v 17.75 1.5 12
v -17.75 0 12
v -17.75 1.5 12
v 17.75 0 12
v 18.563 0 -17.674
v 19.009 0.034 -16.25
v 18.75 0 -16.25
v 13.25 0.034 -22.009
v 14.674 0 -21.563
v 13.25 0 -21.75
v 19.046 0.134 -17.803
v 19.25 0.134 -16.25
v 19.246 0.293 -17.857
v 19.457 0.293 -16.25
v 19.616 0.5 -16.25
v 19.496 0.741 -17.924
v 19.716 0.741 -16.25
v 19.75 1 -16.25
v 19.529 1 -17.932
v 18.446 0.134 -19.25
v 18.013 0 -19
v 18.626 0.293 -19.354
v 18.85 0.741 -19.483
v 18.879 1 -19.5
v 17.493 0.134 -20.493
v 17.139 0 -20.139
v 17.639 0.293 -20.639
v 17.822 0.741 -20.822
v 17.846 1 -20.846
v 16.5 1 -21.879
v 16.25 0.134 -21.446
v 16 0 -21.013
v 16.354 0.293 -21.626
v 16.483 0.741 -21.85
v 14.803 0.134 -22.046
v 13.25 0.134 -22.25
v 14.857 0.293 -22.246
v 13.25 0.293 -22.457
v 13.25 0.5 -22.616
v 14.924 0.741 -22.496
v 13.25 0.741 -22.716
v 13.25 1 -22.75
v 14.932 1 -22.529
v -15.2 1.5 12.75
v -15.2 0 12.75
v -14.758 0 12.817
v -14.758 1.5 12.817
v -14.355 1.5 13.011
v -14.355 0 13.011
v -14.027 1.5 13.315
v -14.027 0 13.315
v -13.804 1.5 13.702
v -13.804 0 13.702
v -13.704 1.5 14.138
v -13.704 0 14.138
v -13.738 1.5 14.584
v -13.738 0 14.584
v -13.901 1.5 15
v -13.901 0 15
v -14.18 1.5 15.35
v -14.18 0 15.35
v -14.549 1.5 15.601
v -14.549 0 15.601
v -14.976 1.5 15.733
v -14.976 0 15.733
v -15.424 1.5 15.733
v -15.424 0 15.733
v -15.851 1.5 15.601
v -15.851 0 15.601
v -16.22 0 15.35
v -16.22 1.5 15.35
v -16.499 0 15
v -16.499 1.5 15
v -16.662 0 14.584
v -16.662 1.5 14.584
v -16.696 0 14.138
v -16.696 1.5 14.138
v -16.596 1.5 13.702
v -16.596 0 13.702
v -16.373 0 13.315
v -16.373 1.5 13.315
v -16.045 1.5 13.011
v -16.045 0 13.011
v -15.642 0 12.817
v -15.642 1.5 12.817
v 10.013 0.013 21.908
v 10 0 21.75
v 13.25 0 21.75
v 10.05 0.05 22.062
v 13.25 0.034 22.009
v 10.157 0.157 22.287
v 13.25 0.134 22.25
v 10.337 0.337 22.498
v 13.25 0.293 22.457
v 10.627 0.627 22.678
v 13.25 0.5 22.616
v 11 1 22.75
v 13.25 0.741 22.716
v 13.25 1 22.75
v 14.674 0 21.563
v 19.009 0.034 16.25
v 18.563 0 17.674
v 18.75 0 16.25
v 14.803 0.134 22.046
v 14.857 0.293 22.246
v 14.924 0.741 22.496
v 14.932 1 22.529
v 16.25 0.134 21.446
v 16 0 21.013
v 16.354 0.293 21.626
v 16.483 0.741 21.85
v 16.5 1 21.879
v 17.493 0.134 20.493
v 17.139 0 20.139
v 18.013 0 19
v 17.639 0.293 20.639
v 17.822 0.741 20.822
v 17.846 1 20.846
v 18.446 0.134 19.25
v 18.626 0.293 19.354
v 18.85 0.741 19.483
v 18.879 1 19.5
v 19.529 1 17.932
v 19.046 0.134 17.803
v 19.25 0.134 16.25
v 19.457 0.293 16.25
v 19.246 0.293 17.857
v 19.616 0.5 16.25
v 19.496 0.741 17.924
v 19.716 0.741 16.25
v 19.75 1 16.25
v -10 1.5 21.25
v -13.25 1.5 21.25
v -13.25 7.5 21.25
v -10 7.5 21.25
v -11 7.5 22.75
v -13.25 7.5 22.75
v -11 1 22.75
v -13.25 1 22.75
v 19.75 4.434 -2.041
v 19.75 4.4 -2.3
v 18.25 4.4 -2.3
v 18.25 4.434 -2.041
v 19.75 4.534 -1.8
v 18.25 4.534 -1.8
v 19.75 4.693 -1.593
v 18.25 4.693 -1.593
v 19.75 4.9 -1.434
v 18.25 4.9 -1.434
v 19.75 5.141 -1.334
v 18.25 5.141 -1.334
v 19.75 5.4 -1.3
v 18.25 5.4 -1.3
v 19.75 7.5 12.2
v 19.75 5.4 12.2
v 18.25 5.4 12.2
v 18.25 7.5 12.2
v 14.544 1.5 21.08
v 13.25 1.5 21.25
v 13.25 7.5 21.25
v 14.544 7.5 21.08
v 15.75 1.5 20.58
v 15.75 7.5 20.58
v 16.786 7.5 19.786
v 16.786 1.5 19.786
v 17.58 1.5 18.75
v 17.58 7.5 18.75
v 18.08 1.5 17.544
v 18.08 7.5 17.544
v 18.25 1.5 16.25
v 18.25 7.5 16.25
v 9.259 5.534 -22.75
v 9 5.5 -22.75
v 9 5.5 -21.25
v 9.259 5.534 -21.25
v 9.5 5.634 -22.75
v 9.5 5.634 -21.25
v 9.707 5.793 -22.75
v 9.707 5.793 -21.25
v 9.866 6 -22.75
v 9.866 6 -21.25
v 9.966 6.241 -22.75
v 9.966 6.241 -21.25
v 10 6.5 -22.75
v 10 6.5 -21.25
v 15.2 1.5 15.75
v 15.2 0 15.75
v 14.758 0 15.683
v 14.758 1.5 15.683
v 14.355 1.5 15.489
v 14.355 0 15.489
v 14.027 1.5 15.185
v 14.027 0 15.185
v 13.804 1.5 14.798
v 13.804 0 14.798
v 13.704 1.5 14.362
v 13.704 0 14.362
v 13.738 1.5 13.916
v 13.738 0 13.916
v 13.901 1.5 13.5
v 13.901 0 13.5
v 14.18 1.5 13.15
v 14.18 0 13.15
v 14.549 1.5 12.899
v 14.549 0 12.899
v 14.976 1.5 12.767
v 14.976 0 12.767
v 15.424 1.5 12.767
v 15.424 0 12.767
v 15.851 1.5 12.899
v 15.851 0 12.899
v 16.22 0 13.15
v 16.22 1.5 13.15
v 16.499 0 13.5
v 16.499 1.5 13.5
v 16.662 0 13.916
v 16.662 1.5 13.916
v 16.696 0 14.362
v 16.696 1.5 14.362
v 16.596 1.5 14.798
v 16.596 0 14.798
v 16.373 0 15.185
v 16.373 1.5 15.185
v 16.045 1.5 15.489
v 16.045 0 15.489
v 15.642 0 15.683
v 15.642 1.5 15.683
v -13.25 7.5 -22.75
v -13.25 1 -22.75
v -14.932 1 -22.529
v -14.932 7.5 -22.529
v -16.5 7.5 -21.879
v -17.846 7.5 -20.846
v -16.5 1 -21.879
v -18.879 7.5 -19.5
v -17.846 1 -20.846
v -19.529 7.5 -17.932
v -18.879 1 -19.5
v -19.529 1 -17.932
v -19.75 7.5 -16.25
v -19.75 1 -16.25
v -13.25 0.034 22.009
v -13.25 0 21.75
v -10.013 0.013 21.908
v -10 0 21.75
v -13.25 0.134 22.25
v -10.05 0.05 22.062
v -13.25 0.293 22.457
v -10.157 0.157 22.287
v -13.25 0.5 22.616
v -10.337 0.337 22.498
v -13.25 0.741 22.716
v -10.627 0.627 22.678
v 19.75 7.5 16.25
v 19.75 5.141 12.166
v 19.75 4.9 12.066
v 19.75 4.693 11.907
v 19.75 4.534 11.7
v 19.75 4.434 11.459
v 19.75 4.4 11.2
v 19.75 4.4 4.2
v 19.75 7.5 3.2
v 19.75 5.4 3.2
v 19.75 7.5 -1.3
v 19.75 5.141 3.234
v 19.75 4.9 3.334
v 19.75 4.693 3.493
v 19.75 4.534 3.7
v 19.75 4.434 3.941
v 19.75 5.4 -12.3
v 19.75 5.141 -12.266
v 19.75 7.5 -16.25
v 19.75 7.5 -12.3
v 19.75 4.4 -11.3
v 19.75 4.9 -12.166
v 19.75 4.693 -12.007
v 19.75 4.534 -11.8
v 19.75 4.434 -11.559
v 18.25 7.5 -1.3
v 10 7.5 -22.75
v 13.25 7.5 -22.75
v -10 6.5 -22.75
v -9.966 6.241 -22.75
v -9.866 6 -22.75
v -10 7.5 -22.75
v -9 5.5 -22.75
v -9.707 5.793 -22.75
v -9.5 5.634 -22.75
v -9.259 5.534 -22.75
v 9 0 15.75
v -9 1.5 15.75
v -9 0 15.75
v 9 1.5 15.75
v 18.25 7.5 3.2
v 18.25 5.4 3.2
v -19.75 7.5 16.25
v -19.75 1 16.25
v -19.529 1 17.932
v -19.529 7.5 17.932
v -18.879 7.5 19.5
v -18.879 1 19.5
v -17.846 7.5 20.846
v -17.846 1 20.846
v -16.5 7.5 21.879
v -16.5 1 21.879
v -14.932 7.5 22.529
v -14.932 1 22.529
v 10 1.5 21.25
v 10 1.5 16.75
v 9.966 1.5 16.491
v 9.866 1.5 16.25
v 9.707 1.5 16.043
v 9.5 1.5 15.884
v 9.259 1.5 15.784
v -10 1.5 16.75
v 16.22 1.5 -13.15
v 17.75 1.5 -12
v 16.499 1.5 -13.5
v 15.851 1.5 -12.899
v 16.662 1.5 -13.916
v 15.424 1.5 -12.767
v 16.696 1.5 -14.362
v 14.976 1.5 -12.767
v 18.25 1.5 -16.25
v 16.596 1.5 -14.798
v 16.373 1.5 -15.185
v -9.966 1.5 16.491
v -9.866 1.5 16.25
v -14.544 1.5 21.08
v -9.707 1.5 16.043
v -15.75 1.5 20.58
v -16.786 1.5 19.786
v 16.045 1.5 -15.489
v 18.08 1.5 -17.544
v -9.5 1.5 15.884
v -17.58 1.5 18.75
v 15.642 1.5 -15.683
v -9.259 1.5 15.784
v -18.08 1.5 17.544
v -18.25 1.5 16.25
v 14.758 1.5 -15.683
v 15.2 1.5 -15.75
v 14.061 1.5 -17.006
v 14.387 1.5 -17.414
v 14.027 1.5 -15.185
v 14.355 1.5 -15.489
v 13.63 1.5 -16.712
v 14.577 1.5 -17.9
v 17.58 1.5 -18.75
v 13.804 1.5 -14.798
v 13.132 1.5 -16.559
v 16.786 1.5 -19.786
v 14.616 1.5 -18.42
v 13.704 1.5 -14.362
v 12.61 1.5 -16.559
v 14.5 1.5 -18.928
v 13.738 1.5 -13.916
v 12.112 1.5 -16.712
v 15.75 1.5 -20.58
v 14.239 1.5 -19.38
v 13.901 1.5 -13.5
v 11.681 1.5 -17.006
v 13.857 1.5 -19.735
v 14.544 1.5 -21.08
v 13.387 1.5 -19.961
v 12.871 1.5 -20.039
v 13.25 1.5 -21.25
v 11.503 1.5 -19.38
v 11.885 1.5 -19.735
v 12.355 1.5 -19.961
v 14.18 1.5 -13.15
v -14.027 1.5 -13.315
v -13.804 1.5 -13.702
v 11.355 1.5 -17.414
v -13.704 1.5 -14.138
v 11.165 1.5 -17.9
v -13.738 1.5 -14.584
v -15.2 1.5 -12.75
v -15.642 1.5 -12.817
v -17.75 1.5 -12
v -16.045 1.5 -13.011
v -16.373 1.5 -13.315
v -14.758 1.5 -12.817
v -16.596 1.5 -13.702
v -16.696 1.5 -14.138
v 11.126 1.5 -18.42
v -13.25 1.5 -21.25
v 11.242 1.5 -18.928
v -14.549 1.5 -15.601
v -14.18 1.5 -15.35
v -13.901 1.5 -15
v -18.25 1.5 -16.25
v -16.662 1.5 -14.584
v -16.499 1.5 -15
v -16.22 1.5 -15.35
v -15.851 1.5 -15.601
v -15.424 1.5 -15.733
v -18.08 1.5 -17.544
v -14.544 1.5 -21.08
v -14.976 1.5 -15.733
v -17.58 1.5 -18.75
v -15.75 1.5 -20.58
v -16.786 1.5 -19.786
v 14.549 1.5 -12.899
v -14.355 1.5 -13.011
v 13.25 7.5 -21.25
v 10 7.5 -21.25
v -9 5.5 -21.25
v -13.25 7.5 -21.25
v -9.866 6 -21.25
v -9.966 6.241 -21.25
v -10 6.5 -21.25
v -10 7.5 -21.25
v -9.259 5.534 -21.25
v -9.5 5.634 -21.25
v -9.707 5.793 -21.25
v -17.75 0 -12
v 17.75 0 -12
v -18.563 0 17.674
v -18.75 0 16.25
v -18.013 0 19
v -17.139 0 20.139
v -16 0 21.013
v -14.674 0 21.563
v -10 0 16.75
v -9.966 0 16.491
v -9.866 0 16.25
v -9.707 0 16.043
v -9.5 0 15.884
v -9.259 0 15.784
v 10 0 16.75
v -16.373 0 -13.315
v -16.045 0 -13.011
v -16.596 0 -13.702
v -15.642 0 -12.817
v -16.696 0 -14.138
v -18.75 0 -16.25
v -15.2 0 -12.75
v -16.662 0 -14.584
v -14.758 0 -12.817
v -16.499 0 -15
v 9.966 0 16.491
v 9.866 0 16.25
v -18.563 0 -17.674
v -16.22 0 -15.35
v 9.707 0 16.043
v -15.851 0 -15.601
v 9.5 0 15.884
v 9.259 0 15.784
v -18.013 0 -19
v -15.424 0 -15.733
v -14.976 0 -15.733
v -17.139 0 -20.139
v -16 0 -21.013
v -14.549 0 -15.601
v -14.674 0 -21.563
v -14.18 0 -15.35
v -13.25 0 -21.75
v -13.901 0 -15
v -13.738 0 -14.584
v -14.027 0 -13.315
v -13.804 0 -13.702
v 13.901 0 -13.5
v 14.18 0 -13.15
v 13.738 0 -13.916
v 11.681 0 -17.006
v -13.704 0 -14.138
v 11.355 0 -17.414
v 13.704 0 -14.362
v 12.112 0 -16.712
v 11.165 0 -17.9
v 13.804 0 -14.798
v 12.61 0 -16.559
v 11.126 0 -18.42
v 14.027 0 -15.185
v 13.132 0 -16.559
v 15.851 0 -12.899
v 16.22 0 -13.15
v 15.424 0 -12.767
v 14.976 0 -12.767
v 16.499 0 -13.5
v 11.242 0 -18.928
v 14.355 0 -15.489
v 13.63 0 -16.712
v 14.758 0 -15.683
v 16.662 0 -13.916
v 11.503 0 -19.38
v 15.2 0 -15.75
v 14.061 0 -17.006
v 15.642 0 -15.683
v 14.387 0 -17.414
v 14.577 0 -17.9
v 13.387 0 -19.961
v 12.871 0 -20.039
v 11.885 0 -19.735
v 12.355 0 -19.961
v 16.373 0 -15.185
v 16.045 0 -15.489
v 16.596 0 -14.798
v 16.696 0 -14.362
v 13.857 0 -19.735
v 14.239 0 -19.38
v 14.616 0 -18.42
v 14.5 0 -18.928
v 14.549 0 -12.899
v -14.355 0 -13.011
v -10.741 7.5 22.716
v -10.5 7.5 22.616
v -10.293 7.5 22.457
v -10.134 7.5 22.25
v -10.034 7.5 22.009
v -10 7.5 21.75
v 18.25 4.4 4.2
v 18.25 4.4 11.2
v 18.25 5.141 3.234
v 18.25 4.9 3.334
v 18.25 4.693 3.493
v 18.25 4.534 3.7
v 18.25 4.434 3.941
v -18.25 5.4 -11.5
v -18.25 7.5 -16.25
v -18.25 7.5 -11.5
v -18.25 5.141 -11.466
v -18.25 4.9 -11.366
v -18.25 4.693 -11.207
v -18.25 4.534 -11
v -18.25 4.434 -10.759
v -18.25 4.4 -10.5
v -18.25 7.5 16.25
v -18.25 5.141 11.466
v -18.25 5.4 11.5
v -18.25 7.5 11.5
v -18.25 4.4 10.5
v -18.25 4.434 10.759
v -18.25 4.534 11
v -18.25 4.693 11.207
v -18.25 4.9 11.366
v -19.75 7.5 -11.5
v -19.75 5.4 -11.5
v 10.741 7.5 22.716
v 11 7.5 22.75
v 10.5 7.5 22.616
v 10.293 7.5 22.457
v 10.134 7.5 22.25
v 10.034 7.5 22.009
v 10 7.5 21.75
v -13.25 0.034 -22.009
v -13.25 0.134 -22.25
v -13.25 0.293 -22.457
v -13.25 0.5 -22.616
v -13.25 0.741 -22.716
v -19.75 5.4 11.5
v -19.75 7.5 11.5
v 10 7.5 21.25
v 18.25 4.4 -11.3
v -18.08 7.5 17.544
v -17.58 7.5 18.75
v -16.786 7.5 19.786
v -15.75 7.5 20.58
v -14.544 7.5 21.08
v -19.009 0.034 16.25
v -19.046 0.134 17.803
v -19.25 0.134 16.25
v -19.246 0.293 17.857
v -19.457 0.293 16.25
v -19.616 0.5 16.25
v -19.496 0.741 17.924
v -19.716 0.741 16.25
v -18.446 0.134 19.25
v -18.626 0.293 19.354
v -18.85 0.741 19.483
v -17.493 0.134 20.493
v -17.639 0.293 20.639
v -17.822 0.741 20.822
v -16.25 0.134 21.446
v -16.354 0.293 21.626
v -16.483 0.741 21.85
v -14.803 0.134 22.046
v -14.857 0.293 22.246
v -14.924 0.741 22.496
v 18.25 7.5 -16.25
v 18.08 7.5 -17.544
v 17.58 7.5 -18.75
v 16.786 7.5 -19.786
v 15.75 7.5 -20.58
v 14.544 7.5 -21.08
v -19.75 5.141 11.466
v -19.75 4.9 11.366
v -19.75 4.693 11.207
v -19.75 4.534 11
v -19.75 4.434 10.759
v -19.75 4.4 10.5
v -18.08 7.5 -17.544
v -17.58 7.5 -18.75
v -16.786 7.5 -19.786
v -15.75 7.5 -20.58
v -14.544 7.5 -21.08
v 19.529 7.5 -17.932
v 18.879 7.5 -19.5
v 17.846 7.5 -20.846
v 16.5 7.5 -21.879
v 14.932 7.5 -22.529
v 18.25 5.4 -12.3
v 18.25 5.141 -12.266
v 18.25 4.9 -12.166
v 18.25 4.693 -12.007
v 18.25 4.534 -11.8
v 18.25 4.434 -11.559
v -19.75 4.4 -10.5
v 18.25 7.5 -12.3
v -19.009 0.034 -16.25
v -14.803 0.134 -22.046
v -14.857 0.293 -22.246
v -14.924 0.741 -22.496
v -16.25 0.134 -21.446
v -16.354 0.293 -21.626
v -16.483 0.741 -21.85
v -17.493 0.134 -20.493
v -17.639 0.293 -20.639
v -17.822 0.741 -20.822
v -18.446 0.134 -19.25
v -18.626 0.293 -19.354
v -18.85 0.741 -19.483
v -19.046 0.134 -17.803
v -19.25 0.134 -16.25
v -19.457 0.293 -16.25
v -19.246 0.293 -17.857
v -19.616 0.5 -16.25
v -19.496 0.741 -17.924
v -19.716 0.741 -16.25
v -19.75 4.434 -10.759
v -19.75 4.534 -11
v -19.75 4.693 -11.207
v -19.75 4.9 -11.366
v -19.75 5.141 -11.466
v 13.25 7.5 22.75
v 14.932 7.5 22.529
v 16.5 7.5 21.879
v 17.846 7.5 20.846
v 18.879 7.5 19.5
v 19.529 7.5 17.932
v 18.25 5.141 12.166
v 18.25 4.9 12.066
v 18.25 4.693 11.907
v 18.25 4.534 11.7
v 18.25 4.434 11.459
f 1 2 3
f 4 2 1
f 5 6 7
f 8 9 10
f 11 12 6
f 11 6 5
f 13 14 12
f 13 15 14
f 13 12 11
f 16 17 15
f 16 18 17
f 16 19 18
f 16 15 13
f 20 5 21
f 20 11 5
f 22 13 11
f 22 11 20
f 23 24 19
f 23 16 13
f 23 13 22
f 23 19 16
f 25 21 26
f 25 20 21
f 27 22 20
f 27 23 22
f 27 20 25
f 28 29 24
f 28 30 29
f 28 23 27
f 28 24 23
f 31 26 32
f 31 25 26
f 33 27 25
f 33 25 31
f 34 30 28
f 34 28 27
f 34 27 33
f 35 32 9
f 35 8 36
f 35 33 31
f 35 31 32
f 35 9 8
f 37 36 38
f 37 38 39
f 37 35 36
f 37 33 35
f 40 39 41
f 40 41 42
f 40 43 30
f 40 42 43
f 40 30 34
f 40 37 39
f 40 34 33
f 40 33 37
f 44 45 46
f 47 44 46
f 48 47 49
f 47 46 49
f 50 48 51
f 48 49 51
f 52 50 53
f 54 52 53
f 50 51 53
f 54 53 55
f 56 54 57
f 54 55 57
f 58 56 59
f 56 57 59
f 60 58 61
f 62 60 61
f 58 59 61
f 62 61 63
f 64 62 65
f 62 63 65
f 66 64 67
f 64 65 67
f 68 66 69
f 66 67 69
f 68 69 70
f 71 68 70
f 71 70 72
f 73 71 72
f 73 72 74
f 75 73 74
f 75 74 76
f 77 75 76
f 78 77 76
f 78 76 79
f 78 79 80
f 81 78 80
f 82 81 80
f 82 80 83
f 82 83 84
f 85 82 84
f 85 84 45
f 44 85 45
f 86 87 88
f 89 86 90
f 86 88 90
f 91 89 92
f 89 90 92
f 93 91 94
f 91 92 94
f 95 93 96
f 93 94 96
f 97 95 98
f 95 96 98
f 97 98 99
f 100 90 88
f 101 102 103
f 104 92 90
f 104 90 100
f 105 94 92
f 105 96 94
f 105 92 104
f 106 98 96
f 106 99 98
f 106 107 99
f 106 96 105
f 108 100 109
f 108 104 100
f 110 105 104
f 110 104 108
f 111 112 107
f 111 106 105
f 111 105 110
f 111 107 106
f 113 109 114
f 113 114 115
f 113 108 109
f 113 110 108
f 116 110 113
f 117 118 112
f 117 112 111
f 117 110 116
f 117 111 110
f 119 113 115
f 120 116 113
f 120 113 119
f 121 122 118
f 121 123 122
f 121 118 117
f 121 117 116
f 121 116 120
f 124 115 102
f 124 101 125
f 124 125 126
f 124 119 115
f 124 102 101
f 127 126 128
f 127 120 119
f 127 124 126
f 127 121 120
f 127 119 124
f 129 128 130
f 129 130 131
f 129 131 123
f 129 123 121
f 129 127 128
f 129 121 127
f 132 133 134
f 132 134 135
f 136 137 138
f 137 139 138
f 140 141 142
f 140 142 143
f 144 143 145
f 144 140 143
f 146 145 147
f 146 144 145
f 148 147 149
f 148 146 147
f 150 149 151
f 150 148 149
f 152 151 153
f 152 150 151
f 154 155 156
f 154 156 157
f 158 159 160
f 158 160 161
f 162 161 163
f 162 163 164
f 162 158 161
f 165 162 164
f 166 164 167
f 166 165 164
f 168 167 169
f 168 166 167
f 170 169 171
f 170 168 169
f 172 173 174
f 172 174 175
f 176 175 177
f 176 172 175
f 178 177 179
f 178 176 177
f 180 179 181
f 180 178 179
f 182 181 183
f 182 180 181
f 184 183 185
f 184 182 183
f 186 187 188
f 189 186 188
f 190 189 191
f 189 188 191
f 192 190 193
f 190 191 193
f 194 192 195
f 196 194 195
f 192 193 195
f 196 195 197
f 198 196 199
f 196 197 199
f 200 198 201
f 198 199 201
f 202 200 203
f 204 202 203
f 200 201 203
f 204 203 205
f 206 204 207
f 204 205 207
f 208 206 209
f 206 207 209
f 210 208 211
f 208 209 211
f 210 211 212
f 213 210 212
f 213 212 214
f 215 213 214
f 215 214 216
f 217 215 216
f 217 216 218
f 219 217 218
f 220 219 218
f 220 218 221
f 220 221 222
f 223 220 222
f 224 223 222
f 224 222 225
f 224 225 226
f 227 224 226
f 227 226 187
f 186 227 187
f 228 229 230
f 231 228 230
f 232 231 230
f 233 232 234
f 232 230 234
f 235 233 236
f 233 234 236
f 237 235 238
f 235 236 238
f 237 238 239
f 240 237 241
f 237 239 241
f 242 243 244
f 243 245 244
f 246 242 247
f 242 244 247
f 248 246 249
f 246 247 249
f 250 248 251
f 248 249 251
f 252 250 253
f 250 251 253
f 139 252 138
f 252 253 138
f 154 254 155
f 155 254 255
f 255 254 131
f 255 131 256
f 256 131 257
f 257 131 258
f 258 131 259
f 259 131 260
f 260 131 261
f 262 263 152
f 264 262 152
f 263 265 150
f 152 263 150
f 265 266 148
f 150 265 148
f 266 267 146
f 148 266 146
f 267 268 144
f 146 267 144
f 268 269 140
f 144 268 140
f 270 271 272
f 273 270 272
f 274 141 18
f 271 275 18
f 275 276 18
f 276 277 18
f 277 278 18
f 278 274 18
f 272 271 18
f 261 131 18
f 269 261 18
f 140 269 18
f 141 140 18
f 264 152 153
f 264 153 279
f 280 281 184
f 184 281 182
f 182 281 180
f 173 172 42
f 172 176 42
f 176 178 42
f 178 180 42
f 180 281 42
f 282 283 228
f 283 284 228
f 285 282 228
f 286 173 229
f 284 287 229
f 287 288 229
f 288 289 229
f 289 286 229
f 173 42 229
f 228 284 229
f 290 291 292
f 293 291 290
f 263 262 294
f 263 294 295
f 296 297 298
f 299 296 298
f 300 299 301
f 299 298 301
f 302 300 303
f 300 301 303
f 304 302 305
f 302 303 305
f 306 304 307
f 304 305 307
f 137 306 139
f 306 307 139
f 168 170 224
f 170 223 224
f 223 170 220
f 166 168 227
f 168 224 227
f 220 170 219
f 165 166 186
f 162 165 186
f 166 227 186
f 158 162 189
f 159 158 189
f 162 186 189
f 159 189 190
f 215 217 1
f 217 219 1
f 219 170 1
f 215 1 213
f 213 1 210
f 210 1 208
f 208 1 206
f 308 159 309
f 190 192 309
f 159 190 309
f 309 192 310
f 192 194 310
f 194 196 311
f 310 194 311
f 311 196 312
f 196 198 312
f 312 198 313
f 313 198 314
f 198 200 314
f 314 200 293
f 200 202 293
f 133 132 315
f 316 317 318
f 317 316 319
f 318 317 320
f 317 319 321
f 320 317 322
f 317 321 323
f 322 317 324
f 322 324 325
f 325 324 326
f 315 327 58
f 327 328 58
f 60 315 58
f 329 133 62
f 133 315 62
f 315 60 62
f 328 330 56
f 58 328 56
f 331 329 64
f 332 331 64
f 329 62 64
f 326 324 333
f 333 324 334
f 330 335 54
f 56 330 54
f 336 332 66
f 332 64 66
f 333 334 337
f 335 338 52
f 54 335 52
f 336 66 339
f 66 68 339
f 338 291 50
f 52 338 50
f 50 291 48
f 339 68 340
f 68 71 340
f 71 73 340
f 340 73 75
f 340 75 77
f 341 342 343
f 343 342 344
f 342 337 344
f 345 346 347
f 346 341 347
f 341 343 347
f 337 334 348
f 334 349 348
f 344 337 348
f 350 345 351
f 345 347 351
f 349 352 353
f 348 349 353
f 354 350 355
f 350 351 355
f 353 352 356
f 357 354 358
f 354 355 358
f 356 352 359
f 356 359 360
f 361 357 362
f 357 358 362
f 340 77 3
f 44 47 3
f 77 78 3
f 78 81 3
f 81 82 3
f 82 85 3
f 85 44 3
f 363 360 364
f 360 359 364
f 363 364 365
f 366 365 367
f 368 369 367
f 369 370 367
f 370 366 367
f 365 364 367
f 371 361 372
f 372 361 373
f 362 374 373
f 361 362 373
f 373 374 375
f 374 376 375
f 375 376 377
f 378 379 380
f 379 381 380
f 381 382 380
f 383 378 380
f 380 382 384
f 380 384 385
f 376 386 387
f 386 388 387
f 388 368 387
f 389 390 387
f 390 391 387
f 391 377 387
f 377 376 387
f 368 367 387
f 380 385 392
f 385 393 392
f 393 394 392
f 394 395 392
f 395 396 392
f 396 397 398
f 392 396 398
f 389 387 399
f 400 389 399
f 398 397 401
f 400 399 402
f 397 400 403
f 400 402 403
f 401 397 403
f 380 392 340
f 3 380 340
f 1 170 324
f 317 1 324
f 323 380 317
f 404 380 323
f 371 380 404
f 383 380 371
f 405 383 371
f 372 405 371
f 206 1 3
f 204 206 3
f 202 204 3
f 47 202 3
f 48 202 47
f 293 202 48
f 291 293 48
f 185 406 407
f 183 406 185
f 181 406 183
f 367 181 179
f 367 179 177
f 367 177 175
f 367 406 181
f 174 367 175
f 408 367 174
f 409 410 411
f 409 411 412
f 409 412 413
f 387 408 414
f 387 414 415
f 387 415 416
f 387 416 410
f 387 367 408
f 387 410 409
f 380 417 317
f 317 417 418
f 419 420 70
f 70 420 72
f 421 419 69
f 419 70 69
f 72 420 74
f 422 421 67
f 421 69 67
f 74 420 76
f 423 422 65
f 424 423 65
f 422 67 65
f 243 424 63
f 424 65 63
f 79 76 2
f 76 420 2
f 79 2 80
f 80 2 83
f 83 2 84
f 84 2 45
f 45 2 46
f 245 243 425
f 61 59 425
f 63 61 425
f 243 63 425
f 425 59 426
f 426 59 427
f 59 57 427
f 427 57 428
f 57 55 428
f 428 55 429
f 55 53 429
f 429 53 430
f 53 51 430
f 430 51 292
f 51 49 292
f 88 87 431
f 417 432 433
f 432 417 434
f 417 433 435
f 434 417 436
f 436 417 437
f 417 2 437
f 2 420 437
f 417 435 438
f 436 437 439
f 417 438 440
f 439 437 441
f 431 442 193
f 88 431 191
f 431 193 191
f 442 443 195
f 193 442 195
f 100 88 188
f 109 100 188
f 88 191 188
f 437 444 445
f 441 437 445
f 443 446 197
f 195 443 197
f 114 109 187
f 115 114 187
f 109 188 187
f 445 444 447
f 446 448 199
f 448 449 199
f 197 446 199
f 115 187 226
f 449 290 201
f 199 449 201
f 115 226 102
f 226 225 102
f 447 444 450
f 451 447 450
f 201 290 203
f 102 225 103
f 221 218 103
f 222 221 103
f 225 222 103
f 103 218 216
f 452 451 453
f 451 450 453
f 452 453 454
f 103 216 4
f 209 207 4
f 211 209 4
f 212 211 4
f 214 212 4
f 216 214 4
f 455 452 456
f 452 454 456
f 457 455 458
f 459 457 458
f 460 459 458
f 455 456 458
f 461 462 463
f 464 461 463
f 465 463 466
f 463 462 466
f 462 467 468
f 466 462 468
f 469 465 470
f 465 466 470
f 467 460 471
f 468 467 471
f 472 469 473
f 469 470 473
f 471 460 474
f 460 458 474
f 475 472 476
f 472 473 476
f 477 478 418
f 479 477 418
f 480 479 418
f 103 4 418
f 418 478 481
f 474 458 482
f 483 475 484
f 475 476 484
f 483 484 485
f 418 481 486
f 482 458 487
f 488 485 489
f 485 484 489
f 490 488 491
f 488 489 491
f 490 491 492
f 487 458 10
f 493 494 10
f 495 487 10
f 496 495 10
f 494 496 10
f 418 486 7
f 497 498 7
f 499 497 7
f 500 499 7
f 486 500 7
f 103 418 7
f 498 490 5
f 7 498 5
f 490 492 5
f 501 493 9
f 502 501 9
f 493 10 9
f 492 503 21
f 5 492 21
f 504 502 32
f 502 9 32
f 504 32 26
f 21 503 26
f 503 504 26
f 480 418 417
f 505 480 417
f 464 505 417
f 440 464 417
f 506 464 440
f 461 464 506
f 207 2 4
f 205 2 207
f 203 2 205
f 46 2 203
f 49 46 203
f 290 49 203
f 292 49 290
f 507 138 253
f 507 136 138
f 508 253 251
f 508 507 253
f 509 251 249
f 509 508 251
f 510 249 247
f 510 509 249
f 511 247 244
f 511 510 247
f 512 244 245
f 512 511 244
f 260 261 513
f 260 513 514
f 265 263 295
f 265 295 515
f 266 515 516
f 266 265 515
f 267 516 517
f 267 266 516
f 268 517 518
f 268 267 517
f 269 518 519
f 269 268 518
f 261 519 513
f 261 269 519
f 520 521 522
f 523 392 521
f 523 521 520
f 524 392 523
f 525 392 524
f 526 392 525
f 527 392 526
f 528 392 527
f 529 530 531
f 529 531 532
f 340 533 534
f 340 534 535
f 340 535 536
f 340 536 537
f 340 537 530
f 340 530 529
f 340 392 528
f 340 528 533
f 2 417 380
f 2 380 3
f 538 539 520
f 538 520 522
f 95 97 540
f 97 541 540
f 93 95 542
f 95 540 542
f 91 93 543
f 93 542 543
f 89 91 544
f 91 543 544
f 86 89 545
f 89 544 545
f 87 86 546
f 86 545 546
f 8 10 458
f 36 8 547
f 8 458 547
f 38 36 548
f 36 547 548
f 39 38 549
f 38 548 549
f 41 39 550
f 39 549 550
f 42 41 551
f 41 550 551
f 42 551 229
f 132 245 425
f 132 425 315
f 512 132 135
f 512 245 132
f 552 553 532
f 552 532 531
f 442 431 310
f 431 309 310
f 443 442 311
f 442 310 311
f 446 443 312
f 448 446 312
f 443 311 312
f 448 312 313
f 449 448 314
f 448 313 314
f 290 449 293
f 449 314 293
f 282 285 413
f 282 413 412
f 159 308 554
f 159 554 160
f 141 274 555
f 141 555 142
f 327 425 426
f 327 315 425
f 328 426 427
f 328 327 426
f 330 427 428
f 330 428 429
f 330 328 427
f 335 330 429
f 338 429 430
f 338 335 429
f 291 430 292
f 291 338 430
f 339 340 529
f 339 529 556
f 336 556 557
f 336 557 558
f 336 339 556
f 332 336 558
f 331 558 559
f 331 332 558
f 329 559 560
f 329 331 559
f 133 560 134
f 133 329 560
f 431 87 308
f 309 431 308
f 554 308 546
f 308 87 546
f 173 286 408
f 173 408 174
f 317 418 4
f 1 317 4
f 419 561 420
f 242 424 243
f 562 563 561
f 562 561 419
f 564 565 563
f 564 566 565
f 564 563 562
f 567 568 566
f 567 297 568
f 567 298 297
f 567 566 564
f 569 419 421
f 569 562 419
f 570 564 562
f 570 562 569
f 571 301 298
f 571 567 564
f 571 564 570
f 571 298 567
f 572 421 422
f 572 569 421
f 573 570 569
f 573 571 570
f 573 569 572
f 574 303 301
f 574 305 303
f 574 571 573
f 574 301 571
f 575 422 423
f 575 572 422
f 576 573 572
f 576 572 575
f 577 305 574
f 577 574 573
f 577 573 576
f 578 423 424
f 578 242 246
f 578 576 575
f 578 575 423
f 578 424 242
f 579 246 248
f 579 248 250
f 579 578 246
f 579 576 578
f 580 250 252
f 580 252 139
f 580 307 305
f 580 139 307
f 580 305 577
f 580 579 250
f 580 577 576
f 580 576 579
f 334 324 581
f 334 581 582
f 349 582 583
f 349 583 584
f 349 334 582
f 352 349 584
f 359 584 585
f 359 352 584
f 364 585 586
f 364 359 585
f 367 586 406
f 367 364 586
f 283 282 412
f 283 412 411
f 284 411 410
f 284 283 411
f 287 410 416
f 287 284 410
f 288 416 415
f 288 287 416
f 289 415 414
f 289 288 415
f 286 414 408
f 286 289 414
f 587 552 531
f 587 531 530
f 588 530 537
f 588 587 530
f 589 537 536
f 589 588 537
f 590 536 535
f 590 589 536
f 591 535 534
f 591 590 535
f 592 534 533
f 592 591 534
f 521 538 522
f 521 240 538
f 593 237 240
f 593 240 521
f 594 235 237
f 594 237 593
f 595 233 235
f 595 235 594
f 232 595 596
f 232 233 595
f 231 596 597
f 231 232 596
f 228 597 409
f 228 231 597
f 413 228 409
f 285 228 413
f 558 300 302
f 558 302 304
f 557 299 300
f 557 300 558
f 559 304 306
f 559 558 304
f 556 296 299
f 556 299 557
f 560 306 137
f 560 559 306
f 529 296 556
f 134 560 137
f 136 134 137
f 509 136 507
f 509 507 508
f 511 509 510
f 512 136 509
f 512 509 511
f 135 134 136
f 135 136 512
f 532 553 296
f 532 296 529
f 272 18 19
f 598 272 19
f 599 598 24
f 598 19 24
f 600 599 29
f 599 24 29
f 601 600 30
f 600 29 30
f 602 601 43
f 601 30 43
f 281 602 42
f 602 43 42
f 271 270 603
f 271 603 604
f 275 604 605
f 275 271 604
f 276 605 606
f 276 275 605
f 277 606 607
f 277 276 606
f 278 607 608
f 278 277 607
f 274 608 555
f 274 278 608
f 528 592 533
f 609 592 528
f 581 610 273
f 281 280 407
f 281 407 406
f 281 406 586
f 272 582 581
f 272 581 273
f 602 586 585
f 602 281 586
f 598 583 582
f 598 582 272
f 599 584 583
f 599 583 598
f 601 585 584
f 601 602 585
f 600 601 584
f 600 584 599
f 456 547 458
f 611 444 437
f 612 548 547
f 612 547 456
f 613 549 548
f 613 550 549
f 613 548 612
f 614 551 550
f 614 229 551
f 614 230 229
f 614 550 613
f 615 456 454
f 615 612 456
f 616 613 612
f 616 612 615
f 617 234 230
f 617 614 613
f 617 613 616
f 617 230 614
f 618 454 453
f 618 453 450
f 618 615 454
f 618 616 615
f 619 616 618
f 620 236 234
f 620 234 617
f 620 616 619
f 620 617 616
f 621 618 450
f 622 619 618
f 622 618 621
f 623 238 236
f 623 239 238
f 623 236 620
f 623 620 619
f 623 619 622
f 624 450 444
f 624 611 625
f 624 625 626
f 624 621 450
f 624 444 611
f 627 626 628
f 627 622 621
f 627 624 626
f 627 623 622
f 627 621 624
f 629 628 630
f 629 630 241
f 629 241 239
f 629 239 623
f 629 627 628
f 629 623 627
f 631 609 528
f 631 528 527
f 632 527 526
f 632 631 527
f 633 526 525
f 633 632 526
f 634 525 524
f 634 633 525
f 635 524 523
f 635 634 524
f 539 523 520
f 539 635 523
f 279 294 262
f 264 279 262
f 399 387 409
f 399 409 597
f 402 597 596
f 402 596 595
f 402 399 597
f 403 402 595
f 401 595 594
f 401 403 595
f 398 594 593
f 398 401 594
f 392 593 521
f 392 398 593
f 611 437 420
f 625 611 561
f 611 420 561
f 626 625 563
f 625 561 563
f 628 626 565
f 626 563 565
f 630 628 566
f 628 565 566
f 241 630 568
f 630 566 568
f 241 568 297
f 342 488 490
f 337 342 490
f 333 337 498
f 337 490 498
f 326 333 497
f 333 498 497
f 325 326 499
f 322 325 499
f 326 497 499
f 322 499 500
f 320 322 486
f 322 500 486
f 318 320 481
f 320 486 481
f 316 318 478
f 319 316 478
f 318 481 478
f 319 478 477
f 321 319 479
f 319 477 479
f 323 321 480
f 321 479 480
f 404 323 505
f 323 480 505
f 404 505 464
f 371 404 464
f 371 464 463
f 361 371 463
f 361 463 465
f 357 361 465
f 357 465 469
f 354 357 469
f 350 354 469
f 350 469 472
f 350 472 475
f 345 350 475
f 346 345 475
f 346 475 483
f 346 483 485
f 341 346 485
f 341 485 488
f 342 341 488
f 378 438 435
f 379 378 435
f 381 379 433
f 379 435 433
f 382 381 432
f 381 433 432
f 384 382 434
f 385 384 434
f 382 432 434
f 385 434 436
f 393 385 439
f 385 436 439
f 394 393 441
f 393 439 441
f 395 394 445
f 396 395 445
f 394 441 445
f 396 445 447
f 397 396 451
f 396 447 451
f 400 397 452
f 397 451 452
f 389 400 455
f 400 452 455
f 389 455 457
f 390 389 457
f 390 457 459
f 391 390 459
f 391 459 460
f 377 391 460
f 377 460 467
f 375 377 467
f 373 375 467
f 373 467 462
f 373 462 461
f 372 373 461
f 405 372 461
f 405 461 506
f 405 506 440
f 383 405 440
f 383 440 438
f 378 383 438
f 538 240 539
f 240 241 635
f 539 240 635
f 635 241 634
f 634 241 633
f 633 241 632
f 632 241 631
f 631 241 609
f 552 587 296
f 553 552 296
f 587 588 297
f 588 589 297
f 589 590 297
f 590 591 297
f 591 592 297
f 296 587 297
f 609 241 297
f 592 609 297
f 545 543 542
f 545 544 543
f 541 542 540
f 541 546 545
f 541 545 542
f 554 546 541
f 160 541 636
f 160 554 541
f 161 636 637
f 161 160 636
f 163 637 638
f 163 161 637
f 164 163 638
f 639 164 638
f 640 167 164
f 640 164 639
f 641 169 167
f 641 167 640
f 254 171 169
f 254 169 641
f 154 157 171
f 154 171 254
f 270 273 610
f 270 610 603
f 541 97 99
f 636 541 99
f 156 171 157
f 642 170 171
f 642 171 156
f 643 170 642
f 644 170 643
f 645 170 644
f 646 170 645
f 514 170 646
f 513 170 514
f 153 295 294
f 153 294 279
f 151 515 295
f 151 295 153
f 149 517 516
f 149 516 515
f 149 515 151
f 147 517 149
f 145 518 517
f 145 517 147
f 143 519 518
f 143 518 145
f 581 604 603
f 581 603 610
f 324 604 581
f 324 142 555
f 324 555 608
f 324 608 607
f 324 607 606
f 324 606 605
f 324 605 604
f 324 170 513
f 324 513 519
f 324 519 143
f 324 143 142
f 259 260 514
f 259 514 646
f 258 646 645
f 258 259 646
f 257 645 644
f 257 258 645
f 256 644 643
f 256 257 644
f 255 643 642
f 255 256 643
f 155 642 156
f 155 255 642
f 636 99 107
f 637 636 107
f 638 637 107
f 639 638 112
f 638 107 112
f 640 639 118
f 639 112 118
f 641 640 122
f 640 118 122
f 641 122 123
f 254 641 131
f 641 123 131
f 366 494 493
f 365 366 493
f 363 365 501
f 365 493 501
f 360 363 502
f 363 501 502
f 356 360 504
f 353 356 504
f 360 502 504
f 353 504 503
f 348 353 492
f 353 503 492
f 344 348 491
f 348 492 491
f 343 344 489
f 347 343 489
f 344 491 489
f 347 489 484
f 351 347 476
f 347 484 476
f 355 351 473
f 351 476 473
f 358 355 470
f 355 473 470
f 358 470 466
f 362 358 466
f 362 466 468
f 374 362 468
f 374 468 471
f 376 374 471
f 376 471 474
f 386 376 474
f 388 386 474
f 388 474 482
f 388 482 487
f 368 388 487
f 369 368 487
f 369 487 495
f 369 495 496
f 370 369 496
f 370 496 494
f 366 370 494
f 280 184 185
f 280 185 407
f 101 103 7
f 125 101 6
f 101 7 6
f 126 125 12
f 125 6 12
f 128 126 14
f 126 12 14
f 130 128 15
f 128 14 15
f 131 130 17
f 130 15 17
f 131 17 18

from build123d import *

# Parameters (mm, degrees)
EXTRUDE_1_DEPTH      = 1.5
EXTRUDE_2_DEPTH      = 6
EXTRUDE_2_DEPTH_BACK = 1.5
CUT_EXTRUDE_1_REACH  = 52.165
SKETCH_4_W           = 20
SKETCH_4_H           = 19.175354044
CUT_EXTRUDE_2_DEPTH  = 7
FILLET_1_R           = 1
SKETCH_5_W           = 35.5
SKETCH_5_H           = 24
CUT_EXTRUDE_3_DEPTH  = 7
SKETCH_6_R           = 1.5
CUT_EXTRUDE_4_DEPTH  = 7
CUT_EXTRUDE_5_DEPTH  = 7
CUT_EXTRUDE_6_DEPTH  = 7
SKETCH_9_R           = 1.75
CUT_EXTRUDE_7_DEPTH  = 10


with BuildPart() as part:
    # 草图1 → 凸台-拉伸1 (new body)
    with BuildSketch(Plane(origin=(0, 0, 0), x_dir=(1, 0, 0), z_dir=(0, 1, 0))):
        with BuildLine():
            Line((-13.25, 21.25), (13.25, 21.25))
            ThreePointArc((13.25, 21.25), (16.785533906, 19.785533906), (18.25, 16.25))
            Line((18.25, 16.25), (18.25, -16.25))
            ThreePointArc((18.25, -16.25), (16.785533906, -19.785533906), (13.25, -21.25))
            Line((13.25, -21.25), (-13.25, -21.25))
            ThreePointArc((-13.25, -21.25), (-16.785533906, -19.785533906), (-18.25, -16.25))
            Line((-18.25, -16.25), (-18.25, 16.25))
            ThreePointArc((-18.25, 16.25), (-16.785533906, 19.785533906), (-13.25, 21.25))
        make_face()
    extrude(amount=EXTRUDE_1_DEPTH)

    # 草图2 → 凸台-拉伸2 (add, two sides: drawn at the far end of the back side and taken through both)
    with BuildSketch(Plane(origin=(0, 1.5, 0), x_dir=(1, 0, 0), z_dir=(0, 1, 0)).offset(-EXTRUDE_2_DEPTH_BACK)):
        with BuildLine():
            Line((-13.25, -22.75), (13.25, -22.75))
            ThreePointArc((13.25, -22.75), (17.846194078, -20.846194078), (19.75, -16.25))
            Line((19.75, -16.25), (19.75, 16.25))
            ThreePointArc((19.75, 16.25), (17.846194078, 20.846194078), (13.25, 22.75))
            Line((13.25, 22.75), (-13.25, 22.75))
            ThreePointArc((-13.25, 22.75), (-17.846194078, 20.846194078), (-19.75, 16.25))
            Line((-19.75, 16.25), (-19.75, -16.25))
            ThreePointArc((-19.75, -16.25), (-17.846194078, -20.846194078), (-13.25, -22.75))
        make_face()
        with BuildLine():
            Line((-13.25, -21.25), (13.25, -21.25))
            ThreePointArc((13.25, -21.25), (16.785533906, -19.785533906), (18.25, -16.25))
            Line((18.25, -16.25), (18.25, 16.25))
            ThreePointArc((18.25, 16.25), (16.785533906, 19.785533906), (13.25, 21.25))
            Line((13.25, 21.25), (-13.25, 21.25))
            ThreePointArc((-13.25, 21.25), (-16.785533906, 19.785533906), (-18.25, 16.25))
            Line((-18.25, 16.25), (-18.25, -16.25))
            ThreePointArc((-18.25, -16.25), (-16.785533906, -19.785533906), (-13.25, -21.25))
        make_face(mode=Mode.SUBTRACT)
    extrude(amount=EXTRUDE_2_DEPTH + EXTRUDE_2_DEPTH_BACK)

    # 草图3 → 切除-拉伸1 (cut, up to next)
    with BuildSketch(Plane(origin=(0, 0, -22.75), x_dir=(-1, 0, 0), z_dir=(0, 0, -1)), mode=Mode.PRIVATE) as cut_extrude_1_sk1:
        with BuildLine():
            Line((-10, 9.5), (10, 9.5))
            Line((10, 9.5), (10, 6.5))
            ThreePointArc((10, 6.5), (9.707106781, 5.792893219), (9, 5.5))
            Line((9, 5.5), (-9, 5.5))
            ThreePointArc((-9, 5.5), (-9.707106781, 5.792893219), (-10, 6.5))
            Line((-10, 6.5), (-10, 9.5))
        make_face()
    cut_extrude_1_tool1 = extrude(cut_extrude_1_sk1.sketch, amount=-CUT_EXTRUDE_1_REACH, mode=Mode.PRIVATE) & part.part
    add(cut_extrude_1_tool1.solids().sort_by_distance((0, 7.509583, -22.75))[0], mode=Mode.SUBTRACT)

    # 草图4 → 切除-拉伸2 (cut)
    with BuildSketch(Plane.XY.offset(22.75)):
        with Locations((0, 7.5)):
            Rectangle(SKETCH_4_W, SKETCH_4_H)
    extrude(amount=-CUT_EXTRUDE_2_DEPTH, mode=Mode.SUBTRACT)

    # 圆角1
    fillet_1_edges = [part.edges().sort_by_distance(p)[0] for p in [
        (10, 0.75, 15.75),
        (-10, 0.75, 15.75),
        (-10, 3.75, 22.75),
        (10, 3.75, 22.75),
        (-17.846194078, 0, 20.846194078),
        (-19.75, 0, 0),
        (-17.846194078, 0, -20.846194078),
        (0, 0, -22.75),
        (17.846194078, 0, -20.846194078),
        (19.75, 0, 0),
        (17.846194078, 0, 20.846194078),
        (-11.625, 0, 22.75),
        (11.625, 0, 22.75),
    ]]
    fillet(fillet_1_edges, radius=FILLET_1_R)

    # 草图5 → 切除-拉伸3 (cut)
    with BuildSketch(Plane.XZ):
        Rectangle(SKETCH_5_W, SKETCH_5_H)
    extrude(amount=-CUT_EXTRUDE_3_DEPTH, mode=Mode.SUBTRACT)

    # 草图6 → 切除-拉伸4 (cut)
    with BuildSketch(Plane.XZ):
        with Locations(Location((-15.2, 14.25, 0), (0, 0, 270))):
            Circle(SKETCH_6_R)
        with Locations(Location((-15.2, -14.25, 0), (0, 0, 90))):
            Circle(SKETCH_6_R)
        with Locations(Location((15.2, -14.25, 0), (0, 0, 270))):
            Circle(SKETCH_6_R)
        with Locations(Location((15.2, 14.25, 0), (0, 0, 90))):
            Circle(SKETCH_6_R)
    extrude(amount=-CUT_EXTRUDE_4_DEPTH, mode=Mode.SUBTRACT)

    # 草图7 → 切除-拉伸5 (cut)
    with BuildSketch(Plane.ZY.offset(19.75)):
        with BuildLine():
            Line((-11.5, 10.6), (11.5, 10.6))
            Line((11.5, 10.6), (11.5, 5.4))
            ThreePointArc((11.5, 5.4), (11.207106781, 4.692893219), (10.5, 4.4))
            Line((10.5, 4.4), (-10.5, 4.4))
            ThreePointArc((-10.5, 4.4), (-11.207106781, 4.692893219), (-11.5, 5.4))
            Line((-11.5, 5.4), (-11.5, 10.6))
        make_face()
    extrude(amount=-CUT_EXTRUDE_5_DEPTH, mode=Mode.SUBTRACT)

    # 草图8 → 切除-拉伸6 (cut)
    with BuildSketch(Plane(origin=(19.75, 0, 0), x_dir=(0, 0, -1), z_dir=(1, 0, 0))):
        with BuildLine():
            Line((1.3, 10.6), (12.3, 10.6))
            Line((12.3, 10.6), (12.3, 5.4))
            ThreePointArc((12.3, 5.4), (12.007106781, 4.692893219), (11.3, 4.4))
            Line((11.3, 4.4), (2.3, 4.4))
            ThreePointArc((2.3, 4.4), (1.592893219, 4.692893219), (1.3, 5.4))
            Line((1.3, 5.4), (1.3, 10.6))
        make_face()
        with BuildLine():
            Line((-12.2, 10.6), (-3.2, 10.6))
            Line((-3.2, 10.6), (-3.2, 5.4))
            ThreePointArc((-3.2, 5.4), (-3.492893219, 4.692893219), (-4.2, 4.4))
            Line((-4.2, 4.4), (-11.2, 4.4))
            ThreePointArc((-11.2, 4.4), (-11.907106781, 4.692893219), (-12.2, 5.4))
            Line((-12.2, 5.4), (-12.2, 10.6))
        make_face()
    extrude(amount=-CUT_EXTRUDE_6_DEPTH, mode=Mode.SUBTRACT)

    # 草图9 → 切除-拉伸7 (cut)
    with BuildSketch(Plane.XZ):
        with Locations(Location((12.871040469, -18.289006858, 0), (0, 0, 270))):
            Circle(SKETCH_9_R)
    extrude(amount=-CUT_EXTRUDE_7_DEPTH, mode=Mode.SUBTRACT)


solid = part.part
